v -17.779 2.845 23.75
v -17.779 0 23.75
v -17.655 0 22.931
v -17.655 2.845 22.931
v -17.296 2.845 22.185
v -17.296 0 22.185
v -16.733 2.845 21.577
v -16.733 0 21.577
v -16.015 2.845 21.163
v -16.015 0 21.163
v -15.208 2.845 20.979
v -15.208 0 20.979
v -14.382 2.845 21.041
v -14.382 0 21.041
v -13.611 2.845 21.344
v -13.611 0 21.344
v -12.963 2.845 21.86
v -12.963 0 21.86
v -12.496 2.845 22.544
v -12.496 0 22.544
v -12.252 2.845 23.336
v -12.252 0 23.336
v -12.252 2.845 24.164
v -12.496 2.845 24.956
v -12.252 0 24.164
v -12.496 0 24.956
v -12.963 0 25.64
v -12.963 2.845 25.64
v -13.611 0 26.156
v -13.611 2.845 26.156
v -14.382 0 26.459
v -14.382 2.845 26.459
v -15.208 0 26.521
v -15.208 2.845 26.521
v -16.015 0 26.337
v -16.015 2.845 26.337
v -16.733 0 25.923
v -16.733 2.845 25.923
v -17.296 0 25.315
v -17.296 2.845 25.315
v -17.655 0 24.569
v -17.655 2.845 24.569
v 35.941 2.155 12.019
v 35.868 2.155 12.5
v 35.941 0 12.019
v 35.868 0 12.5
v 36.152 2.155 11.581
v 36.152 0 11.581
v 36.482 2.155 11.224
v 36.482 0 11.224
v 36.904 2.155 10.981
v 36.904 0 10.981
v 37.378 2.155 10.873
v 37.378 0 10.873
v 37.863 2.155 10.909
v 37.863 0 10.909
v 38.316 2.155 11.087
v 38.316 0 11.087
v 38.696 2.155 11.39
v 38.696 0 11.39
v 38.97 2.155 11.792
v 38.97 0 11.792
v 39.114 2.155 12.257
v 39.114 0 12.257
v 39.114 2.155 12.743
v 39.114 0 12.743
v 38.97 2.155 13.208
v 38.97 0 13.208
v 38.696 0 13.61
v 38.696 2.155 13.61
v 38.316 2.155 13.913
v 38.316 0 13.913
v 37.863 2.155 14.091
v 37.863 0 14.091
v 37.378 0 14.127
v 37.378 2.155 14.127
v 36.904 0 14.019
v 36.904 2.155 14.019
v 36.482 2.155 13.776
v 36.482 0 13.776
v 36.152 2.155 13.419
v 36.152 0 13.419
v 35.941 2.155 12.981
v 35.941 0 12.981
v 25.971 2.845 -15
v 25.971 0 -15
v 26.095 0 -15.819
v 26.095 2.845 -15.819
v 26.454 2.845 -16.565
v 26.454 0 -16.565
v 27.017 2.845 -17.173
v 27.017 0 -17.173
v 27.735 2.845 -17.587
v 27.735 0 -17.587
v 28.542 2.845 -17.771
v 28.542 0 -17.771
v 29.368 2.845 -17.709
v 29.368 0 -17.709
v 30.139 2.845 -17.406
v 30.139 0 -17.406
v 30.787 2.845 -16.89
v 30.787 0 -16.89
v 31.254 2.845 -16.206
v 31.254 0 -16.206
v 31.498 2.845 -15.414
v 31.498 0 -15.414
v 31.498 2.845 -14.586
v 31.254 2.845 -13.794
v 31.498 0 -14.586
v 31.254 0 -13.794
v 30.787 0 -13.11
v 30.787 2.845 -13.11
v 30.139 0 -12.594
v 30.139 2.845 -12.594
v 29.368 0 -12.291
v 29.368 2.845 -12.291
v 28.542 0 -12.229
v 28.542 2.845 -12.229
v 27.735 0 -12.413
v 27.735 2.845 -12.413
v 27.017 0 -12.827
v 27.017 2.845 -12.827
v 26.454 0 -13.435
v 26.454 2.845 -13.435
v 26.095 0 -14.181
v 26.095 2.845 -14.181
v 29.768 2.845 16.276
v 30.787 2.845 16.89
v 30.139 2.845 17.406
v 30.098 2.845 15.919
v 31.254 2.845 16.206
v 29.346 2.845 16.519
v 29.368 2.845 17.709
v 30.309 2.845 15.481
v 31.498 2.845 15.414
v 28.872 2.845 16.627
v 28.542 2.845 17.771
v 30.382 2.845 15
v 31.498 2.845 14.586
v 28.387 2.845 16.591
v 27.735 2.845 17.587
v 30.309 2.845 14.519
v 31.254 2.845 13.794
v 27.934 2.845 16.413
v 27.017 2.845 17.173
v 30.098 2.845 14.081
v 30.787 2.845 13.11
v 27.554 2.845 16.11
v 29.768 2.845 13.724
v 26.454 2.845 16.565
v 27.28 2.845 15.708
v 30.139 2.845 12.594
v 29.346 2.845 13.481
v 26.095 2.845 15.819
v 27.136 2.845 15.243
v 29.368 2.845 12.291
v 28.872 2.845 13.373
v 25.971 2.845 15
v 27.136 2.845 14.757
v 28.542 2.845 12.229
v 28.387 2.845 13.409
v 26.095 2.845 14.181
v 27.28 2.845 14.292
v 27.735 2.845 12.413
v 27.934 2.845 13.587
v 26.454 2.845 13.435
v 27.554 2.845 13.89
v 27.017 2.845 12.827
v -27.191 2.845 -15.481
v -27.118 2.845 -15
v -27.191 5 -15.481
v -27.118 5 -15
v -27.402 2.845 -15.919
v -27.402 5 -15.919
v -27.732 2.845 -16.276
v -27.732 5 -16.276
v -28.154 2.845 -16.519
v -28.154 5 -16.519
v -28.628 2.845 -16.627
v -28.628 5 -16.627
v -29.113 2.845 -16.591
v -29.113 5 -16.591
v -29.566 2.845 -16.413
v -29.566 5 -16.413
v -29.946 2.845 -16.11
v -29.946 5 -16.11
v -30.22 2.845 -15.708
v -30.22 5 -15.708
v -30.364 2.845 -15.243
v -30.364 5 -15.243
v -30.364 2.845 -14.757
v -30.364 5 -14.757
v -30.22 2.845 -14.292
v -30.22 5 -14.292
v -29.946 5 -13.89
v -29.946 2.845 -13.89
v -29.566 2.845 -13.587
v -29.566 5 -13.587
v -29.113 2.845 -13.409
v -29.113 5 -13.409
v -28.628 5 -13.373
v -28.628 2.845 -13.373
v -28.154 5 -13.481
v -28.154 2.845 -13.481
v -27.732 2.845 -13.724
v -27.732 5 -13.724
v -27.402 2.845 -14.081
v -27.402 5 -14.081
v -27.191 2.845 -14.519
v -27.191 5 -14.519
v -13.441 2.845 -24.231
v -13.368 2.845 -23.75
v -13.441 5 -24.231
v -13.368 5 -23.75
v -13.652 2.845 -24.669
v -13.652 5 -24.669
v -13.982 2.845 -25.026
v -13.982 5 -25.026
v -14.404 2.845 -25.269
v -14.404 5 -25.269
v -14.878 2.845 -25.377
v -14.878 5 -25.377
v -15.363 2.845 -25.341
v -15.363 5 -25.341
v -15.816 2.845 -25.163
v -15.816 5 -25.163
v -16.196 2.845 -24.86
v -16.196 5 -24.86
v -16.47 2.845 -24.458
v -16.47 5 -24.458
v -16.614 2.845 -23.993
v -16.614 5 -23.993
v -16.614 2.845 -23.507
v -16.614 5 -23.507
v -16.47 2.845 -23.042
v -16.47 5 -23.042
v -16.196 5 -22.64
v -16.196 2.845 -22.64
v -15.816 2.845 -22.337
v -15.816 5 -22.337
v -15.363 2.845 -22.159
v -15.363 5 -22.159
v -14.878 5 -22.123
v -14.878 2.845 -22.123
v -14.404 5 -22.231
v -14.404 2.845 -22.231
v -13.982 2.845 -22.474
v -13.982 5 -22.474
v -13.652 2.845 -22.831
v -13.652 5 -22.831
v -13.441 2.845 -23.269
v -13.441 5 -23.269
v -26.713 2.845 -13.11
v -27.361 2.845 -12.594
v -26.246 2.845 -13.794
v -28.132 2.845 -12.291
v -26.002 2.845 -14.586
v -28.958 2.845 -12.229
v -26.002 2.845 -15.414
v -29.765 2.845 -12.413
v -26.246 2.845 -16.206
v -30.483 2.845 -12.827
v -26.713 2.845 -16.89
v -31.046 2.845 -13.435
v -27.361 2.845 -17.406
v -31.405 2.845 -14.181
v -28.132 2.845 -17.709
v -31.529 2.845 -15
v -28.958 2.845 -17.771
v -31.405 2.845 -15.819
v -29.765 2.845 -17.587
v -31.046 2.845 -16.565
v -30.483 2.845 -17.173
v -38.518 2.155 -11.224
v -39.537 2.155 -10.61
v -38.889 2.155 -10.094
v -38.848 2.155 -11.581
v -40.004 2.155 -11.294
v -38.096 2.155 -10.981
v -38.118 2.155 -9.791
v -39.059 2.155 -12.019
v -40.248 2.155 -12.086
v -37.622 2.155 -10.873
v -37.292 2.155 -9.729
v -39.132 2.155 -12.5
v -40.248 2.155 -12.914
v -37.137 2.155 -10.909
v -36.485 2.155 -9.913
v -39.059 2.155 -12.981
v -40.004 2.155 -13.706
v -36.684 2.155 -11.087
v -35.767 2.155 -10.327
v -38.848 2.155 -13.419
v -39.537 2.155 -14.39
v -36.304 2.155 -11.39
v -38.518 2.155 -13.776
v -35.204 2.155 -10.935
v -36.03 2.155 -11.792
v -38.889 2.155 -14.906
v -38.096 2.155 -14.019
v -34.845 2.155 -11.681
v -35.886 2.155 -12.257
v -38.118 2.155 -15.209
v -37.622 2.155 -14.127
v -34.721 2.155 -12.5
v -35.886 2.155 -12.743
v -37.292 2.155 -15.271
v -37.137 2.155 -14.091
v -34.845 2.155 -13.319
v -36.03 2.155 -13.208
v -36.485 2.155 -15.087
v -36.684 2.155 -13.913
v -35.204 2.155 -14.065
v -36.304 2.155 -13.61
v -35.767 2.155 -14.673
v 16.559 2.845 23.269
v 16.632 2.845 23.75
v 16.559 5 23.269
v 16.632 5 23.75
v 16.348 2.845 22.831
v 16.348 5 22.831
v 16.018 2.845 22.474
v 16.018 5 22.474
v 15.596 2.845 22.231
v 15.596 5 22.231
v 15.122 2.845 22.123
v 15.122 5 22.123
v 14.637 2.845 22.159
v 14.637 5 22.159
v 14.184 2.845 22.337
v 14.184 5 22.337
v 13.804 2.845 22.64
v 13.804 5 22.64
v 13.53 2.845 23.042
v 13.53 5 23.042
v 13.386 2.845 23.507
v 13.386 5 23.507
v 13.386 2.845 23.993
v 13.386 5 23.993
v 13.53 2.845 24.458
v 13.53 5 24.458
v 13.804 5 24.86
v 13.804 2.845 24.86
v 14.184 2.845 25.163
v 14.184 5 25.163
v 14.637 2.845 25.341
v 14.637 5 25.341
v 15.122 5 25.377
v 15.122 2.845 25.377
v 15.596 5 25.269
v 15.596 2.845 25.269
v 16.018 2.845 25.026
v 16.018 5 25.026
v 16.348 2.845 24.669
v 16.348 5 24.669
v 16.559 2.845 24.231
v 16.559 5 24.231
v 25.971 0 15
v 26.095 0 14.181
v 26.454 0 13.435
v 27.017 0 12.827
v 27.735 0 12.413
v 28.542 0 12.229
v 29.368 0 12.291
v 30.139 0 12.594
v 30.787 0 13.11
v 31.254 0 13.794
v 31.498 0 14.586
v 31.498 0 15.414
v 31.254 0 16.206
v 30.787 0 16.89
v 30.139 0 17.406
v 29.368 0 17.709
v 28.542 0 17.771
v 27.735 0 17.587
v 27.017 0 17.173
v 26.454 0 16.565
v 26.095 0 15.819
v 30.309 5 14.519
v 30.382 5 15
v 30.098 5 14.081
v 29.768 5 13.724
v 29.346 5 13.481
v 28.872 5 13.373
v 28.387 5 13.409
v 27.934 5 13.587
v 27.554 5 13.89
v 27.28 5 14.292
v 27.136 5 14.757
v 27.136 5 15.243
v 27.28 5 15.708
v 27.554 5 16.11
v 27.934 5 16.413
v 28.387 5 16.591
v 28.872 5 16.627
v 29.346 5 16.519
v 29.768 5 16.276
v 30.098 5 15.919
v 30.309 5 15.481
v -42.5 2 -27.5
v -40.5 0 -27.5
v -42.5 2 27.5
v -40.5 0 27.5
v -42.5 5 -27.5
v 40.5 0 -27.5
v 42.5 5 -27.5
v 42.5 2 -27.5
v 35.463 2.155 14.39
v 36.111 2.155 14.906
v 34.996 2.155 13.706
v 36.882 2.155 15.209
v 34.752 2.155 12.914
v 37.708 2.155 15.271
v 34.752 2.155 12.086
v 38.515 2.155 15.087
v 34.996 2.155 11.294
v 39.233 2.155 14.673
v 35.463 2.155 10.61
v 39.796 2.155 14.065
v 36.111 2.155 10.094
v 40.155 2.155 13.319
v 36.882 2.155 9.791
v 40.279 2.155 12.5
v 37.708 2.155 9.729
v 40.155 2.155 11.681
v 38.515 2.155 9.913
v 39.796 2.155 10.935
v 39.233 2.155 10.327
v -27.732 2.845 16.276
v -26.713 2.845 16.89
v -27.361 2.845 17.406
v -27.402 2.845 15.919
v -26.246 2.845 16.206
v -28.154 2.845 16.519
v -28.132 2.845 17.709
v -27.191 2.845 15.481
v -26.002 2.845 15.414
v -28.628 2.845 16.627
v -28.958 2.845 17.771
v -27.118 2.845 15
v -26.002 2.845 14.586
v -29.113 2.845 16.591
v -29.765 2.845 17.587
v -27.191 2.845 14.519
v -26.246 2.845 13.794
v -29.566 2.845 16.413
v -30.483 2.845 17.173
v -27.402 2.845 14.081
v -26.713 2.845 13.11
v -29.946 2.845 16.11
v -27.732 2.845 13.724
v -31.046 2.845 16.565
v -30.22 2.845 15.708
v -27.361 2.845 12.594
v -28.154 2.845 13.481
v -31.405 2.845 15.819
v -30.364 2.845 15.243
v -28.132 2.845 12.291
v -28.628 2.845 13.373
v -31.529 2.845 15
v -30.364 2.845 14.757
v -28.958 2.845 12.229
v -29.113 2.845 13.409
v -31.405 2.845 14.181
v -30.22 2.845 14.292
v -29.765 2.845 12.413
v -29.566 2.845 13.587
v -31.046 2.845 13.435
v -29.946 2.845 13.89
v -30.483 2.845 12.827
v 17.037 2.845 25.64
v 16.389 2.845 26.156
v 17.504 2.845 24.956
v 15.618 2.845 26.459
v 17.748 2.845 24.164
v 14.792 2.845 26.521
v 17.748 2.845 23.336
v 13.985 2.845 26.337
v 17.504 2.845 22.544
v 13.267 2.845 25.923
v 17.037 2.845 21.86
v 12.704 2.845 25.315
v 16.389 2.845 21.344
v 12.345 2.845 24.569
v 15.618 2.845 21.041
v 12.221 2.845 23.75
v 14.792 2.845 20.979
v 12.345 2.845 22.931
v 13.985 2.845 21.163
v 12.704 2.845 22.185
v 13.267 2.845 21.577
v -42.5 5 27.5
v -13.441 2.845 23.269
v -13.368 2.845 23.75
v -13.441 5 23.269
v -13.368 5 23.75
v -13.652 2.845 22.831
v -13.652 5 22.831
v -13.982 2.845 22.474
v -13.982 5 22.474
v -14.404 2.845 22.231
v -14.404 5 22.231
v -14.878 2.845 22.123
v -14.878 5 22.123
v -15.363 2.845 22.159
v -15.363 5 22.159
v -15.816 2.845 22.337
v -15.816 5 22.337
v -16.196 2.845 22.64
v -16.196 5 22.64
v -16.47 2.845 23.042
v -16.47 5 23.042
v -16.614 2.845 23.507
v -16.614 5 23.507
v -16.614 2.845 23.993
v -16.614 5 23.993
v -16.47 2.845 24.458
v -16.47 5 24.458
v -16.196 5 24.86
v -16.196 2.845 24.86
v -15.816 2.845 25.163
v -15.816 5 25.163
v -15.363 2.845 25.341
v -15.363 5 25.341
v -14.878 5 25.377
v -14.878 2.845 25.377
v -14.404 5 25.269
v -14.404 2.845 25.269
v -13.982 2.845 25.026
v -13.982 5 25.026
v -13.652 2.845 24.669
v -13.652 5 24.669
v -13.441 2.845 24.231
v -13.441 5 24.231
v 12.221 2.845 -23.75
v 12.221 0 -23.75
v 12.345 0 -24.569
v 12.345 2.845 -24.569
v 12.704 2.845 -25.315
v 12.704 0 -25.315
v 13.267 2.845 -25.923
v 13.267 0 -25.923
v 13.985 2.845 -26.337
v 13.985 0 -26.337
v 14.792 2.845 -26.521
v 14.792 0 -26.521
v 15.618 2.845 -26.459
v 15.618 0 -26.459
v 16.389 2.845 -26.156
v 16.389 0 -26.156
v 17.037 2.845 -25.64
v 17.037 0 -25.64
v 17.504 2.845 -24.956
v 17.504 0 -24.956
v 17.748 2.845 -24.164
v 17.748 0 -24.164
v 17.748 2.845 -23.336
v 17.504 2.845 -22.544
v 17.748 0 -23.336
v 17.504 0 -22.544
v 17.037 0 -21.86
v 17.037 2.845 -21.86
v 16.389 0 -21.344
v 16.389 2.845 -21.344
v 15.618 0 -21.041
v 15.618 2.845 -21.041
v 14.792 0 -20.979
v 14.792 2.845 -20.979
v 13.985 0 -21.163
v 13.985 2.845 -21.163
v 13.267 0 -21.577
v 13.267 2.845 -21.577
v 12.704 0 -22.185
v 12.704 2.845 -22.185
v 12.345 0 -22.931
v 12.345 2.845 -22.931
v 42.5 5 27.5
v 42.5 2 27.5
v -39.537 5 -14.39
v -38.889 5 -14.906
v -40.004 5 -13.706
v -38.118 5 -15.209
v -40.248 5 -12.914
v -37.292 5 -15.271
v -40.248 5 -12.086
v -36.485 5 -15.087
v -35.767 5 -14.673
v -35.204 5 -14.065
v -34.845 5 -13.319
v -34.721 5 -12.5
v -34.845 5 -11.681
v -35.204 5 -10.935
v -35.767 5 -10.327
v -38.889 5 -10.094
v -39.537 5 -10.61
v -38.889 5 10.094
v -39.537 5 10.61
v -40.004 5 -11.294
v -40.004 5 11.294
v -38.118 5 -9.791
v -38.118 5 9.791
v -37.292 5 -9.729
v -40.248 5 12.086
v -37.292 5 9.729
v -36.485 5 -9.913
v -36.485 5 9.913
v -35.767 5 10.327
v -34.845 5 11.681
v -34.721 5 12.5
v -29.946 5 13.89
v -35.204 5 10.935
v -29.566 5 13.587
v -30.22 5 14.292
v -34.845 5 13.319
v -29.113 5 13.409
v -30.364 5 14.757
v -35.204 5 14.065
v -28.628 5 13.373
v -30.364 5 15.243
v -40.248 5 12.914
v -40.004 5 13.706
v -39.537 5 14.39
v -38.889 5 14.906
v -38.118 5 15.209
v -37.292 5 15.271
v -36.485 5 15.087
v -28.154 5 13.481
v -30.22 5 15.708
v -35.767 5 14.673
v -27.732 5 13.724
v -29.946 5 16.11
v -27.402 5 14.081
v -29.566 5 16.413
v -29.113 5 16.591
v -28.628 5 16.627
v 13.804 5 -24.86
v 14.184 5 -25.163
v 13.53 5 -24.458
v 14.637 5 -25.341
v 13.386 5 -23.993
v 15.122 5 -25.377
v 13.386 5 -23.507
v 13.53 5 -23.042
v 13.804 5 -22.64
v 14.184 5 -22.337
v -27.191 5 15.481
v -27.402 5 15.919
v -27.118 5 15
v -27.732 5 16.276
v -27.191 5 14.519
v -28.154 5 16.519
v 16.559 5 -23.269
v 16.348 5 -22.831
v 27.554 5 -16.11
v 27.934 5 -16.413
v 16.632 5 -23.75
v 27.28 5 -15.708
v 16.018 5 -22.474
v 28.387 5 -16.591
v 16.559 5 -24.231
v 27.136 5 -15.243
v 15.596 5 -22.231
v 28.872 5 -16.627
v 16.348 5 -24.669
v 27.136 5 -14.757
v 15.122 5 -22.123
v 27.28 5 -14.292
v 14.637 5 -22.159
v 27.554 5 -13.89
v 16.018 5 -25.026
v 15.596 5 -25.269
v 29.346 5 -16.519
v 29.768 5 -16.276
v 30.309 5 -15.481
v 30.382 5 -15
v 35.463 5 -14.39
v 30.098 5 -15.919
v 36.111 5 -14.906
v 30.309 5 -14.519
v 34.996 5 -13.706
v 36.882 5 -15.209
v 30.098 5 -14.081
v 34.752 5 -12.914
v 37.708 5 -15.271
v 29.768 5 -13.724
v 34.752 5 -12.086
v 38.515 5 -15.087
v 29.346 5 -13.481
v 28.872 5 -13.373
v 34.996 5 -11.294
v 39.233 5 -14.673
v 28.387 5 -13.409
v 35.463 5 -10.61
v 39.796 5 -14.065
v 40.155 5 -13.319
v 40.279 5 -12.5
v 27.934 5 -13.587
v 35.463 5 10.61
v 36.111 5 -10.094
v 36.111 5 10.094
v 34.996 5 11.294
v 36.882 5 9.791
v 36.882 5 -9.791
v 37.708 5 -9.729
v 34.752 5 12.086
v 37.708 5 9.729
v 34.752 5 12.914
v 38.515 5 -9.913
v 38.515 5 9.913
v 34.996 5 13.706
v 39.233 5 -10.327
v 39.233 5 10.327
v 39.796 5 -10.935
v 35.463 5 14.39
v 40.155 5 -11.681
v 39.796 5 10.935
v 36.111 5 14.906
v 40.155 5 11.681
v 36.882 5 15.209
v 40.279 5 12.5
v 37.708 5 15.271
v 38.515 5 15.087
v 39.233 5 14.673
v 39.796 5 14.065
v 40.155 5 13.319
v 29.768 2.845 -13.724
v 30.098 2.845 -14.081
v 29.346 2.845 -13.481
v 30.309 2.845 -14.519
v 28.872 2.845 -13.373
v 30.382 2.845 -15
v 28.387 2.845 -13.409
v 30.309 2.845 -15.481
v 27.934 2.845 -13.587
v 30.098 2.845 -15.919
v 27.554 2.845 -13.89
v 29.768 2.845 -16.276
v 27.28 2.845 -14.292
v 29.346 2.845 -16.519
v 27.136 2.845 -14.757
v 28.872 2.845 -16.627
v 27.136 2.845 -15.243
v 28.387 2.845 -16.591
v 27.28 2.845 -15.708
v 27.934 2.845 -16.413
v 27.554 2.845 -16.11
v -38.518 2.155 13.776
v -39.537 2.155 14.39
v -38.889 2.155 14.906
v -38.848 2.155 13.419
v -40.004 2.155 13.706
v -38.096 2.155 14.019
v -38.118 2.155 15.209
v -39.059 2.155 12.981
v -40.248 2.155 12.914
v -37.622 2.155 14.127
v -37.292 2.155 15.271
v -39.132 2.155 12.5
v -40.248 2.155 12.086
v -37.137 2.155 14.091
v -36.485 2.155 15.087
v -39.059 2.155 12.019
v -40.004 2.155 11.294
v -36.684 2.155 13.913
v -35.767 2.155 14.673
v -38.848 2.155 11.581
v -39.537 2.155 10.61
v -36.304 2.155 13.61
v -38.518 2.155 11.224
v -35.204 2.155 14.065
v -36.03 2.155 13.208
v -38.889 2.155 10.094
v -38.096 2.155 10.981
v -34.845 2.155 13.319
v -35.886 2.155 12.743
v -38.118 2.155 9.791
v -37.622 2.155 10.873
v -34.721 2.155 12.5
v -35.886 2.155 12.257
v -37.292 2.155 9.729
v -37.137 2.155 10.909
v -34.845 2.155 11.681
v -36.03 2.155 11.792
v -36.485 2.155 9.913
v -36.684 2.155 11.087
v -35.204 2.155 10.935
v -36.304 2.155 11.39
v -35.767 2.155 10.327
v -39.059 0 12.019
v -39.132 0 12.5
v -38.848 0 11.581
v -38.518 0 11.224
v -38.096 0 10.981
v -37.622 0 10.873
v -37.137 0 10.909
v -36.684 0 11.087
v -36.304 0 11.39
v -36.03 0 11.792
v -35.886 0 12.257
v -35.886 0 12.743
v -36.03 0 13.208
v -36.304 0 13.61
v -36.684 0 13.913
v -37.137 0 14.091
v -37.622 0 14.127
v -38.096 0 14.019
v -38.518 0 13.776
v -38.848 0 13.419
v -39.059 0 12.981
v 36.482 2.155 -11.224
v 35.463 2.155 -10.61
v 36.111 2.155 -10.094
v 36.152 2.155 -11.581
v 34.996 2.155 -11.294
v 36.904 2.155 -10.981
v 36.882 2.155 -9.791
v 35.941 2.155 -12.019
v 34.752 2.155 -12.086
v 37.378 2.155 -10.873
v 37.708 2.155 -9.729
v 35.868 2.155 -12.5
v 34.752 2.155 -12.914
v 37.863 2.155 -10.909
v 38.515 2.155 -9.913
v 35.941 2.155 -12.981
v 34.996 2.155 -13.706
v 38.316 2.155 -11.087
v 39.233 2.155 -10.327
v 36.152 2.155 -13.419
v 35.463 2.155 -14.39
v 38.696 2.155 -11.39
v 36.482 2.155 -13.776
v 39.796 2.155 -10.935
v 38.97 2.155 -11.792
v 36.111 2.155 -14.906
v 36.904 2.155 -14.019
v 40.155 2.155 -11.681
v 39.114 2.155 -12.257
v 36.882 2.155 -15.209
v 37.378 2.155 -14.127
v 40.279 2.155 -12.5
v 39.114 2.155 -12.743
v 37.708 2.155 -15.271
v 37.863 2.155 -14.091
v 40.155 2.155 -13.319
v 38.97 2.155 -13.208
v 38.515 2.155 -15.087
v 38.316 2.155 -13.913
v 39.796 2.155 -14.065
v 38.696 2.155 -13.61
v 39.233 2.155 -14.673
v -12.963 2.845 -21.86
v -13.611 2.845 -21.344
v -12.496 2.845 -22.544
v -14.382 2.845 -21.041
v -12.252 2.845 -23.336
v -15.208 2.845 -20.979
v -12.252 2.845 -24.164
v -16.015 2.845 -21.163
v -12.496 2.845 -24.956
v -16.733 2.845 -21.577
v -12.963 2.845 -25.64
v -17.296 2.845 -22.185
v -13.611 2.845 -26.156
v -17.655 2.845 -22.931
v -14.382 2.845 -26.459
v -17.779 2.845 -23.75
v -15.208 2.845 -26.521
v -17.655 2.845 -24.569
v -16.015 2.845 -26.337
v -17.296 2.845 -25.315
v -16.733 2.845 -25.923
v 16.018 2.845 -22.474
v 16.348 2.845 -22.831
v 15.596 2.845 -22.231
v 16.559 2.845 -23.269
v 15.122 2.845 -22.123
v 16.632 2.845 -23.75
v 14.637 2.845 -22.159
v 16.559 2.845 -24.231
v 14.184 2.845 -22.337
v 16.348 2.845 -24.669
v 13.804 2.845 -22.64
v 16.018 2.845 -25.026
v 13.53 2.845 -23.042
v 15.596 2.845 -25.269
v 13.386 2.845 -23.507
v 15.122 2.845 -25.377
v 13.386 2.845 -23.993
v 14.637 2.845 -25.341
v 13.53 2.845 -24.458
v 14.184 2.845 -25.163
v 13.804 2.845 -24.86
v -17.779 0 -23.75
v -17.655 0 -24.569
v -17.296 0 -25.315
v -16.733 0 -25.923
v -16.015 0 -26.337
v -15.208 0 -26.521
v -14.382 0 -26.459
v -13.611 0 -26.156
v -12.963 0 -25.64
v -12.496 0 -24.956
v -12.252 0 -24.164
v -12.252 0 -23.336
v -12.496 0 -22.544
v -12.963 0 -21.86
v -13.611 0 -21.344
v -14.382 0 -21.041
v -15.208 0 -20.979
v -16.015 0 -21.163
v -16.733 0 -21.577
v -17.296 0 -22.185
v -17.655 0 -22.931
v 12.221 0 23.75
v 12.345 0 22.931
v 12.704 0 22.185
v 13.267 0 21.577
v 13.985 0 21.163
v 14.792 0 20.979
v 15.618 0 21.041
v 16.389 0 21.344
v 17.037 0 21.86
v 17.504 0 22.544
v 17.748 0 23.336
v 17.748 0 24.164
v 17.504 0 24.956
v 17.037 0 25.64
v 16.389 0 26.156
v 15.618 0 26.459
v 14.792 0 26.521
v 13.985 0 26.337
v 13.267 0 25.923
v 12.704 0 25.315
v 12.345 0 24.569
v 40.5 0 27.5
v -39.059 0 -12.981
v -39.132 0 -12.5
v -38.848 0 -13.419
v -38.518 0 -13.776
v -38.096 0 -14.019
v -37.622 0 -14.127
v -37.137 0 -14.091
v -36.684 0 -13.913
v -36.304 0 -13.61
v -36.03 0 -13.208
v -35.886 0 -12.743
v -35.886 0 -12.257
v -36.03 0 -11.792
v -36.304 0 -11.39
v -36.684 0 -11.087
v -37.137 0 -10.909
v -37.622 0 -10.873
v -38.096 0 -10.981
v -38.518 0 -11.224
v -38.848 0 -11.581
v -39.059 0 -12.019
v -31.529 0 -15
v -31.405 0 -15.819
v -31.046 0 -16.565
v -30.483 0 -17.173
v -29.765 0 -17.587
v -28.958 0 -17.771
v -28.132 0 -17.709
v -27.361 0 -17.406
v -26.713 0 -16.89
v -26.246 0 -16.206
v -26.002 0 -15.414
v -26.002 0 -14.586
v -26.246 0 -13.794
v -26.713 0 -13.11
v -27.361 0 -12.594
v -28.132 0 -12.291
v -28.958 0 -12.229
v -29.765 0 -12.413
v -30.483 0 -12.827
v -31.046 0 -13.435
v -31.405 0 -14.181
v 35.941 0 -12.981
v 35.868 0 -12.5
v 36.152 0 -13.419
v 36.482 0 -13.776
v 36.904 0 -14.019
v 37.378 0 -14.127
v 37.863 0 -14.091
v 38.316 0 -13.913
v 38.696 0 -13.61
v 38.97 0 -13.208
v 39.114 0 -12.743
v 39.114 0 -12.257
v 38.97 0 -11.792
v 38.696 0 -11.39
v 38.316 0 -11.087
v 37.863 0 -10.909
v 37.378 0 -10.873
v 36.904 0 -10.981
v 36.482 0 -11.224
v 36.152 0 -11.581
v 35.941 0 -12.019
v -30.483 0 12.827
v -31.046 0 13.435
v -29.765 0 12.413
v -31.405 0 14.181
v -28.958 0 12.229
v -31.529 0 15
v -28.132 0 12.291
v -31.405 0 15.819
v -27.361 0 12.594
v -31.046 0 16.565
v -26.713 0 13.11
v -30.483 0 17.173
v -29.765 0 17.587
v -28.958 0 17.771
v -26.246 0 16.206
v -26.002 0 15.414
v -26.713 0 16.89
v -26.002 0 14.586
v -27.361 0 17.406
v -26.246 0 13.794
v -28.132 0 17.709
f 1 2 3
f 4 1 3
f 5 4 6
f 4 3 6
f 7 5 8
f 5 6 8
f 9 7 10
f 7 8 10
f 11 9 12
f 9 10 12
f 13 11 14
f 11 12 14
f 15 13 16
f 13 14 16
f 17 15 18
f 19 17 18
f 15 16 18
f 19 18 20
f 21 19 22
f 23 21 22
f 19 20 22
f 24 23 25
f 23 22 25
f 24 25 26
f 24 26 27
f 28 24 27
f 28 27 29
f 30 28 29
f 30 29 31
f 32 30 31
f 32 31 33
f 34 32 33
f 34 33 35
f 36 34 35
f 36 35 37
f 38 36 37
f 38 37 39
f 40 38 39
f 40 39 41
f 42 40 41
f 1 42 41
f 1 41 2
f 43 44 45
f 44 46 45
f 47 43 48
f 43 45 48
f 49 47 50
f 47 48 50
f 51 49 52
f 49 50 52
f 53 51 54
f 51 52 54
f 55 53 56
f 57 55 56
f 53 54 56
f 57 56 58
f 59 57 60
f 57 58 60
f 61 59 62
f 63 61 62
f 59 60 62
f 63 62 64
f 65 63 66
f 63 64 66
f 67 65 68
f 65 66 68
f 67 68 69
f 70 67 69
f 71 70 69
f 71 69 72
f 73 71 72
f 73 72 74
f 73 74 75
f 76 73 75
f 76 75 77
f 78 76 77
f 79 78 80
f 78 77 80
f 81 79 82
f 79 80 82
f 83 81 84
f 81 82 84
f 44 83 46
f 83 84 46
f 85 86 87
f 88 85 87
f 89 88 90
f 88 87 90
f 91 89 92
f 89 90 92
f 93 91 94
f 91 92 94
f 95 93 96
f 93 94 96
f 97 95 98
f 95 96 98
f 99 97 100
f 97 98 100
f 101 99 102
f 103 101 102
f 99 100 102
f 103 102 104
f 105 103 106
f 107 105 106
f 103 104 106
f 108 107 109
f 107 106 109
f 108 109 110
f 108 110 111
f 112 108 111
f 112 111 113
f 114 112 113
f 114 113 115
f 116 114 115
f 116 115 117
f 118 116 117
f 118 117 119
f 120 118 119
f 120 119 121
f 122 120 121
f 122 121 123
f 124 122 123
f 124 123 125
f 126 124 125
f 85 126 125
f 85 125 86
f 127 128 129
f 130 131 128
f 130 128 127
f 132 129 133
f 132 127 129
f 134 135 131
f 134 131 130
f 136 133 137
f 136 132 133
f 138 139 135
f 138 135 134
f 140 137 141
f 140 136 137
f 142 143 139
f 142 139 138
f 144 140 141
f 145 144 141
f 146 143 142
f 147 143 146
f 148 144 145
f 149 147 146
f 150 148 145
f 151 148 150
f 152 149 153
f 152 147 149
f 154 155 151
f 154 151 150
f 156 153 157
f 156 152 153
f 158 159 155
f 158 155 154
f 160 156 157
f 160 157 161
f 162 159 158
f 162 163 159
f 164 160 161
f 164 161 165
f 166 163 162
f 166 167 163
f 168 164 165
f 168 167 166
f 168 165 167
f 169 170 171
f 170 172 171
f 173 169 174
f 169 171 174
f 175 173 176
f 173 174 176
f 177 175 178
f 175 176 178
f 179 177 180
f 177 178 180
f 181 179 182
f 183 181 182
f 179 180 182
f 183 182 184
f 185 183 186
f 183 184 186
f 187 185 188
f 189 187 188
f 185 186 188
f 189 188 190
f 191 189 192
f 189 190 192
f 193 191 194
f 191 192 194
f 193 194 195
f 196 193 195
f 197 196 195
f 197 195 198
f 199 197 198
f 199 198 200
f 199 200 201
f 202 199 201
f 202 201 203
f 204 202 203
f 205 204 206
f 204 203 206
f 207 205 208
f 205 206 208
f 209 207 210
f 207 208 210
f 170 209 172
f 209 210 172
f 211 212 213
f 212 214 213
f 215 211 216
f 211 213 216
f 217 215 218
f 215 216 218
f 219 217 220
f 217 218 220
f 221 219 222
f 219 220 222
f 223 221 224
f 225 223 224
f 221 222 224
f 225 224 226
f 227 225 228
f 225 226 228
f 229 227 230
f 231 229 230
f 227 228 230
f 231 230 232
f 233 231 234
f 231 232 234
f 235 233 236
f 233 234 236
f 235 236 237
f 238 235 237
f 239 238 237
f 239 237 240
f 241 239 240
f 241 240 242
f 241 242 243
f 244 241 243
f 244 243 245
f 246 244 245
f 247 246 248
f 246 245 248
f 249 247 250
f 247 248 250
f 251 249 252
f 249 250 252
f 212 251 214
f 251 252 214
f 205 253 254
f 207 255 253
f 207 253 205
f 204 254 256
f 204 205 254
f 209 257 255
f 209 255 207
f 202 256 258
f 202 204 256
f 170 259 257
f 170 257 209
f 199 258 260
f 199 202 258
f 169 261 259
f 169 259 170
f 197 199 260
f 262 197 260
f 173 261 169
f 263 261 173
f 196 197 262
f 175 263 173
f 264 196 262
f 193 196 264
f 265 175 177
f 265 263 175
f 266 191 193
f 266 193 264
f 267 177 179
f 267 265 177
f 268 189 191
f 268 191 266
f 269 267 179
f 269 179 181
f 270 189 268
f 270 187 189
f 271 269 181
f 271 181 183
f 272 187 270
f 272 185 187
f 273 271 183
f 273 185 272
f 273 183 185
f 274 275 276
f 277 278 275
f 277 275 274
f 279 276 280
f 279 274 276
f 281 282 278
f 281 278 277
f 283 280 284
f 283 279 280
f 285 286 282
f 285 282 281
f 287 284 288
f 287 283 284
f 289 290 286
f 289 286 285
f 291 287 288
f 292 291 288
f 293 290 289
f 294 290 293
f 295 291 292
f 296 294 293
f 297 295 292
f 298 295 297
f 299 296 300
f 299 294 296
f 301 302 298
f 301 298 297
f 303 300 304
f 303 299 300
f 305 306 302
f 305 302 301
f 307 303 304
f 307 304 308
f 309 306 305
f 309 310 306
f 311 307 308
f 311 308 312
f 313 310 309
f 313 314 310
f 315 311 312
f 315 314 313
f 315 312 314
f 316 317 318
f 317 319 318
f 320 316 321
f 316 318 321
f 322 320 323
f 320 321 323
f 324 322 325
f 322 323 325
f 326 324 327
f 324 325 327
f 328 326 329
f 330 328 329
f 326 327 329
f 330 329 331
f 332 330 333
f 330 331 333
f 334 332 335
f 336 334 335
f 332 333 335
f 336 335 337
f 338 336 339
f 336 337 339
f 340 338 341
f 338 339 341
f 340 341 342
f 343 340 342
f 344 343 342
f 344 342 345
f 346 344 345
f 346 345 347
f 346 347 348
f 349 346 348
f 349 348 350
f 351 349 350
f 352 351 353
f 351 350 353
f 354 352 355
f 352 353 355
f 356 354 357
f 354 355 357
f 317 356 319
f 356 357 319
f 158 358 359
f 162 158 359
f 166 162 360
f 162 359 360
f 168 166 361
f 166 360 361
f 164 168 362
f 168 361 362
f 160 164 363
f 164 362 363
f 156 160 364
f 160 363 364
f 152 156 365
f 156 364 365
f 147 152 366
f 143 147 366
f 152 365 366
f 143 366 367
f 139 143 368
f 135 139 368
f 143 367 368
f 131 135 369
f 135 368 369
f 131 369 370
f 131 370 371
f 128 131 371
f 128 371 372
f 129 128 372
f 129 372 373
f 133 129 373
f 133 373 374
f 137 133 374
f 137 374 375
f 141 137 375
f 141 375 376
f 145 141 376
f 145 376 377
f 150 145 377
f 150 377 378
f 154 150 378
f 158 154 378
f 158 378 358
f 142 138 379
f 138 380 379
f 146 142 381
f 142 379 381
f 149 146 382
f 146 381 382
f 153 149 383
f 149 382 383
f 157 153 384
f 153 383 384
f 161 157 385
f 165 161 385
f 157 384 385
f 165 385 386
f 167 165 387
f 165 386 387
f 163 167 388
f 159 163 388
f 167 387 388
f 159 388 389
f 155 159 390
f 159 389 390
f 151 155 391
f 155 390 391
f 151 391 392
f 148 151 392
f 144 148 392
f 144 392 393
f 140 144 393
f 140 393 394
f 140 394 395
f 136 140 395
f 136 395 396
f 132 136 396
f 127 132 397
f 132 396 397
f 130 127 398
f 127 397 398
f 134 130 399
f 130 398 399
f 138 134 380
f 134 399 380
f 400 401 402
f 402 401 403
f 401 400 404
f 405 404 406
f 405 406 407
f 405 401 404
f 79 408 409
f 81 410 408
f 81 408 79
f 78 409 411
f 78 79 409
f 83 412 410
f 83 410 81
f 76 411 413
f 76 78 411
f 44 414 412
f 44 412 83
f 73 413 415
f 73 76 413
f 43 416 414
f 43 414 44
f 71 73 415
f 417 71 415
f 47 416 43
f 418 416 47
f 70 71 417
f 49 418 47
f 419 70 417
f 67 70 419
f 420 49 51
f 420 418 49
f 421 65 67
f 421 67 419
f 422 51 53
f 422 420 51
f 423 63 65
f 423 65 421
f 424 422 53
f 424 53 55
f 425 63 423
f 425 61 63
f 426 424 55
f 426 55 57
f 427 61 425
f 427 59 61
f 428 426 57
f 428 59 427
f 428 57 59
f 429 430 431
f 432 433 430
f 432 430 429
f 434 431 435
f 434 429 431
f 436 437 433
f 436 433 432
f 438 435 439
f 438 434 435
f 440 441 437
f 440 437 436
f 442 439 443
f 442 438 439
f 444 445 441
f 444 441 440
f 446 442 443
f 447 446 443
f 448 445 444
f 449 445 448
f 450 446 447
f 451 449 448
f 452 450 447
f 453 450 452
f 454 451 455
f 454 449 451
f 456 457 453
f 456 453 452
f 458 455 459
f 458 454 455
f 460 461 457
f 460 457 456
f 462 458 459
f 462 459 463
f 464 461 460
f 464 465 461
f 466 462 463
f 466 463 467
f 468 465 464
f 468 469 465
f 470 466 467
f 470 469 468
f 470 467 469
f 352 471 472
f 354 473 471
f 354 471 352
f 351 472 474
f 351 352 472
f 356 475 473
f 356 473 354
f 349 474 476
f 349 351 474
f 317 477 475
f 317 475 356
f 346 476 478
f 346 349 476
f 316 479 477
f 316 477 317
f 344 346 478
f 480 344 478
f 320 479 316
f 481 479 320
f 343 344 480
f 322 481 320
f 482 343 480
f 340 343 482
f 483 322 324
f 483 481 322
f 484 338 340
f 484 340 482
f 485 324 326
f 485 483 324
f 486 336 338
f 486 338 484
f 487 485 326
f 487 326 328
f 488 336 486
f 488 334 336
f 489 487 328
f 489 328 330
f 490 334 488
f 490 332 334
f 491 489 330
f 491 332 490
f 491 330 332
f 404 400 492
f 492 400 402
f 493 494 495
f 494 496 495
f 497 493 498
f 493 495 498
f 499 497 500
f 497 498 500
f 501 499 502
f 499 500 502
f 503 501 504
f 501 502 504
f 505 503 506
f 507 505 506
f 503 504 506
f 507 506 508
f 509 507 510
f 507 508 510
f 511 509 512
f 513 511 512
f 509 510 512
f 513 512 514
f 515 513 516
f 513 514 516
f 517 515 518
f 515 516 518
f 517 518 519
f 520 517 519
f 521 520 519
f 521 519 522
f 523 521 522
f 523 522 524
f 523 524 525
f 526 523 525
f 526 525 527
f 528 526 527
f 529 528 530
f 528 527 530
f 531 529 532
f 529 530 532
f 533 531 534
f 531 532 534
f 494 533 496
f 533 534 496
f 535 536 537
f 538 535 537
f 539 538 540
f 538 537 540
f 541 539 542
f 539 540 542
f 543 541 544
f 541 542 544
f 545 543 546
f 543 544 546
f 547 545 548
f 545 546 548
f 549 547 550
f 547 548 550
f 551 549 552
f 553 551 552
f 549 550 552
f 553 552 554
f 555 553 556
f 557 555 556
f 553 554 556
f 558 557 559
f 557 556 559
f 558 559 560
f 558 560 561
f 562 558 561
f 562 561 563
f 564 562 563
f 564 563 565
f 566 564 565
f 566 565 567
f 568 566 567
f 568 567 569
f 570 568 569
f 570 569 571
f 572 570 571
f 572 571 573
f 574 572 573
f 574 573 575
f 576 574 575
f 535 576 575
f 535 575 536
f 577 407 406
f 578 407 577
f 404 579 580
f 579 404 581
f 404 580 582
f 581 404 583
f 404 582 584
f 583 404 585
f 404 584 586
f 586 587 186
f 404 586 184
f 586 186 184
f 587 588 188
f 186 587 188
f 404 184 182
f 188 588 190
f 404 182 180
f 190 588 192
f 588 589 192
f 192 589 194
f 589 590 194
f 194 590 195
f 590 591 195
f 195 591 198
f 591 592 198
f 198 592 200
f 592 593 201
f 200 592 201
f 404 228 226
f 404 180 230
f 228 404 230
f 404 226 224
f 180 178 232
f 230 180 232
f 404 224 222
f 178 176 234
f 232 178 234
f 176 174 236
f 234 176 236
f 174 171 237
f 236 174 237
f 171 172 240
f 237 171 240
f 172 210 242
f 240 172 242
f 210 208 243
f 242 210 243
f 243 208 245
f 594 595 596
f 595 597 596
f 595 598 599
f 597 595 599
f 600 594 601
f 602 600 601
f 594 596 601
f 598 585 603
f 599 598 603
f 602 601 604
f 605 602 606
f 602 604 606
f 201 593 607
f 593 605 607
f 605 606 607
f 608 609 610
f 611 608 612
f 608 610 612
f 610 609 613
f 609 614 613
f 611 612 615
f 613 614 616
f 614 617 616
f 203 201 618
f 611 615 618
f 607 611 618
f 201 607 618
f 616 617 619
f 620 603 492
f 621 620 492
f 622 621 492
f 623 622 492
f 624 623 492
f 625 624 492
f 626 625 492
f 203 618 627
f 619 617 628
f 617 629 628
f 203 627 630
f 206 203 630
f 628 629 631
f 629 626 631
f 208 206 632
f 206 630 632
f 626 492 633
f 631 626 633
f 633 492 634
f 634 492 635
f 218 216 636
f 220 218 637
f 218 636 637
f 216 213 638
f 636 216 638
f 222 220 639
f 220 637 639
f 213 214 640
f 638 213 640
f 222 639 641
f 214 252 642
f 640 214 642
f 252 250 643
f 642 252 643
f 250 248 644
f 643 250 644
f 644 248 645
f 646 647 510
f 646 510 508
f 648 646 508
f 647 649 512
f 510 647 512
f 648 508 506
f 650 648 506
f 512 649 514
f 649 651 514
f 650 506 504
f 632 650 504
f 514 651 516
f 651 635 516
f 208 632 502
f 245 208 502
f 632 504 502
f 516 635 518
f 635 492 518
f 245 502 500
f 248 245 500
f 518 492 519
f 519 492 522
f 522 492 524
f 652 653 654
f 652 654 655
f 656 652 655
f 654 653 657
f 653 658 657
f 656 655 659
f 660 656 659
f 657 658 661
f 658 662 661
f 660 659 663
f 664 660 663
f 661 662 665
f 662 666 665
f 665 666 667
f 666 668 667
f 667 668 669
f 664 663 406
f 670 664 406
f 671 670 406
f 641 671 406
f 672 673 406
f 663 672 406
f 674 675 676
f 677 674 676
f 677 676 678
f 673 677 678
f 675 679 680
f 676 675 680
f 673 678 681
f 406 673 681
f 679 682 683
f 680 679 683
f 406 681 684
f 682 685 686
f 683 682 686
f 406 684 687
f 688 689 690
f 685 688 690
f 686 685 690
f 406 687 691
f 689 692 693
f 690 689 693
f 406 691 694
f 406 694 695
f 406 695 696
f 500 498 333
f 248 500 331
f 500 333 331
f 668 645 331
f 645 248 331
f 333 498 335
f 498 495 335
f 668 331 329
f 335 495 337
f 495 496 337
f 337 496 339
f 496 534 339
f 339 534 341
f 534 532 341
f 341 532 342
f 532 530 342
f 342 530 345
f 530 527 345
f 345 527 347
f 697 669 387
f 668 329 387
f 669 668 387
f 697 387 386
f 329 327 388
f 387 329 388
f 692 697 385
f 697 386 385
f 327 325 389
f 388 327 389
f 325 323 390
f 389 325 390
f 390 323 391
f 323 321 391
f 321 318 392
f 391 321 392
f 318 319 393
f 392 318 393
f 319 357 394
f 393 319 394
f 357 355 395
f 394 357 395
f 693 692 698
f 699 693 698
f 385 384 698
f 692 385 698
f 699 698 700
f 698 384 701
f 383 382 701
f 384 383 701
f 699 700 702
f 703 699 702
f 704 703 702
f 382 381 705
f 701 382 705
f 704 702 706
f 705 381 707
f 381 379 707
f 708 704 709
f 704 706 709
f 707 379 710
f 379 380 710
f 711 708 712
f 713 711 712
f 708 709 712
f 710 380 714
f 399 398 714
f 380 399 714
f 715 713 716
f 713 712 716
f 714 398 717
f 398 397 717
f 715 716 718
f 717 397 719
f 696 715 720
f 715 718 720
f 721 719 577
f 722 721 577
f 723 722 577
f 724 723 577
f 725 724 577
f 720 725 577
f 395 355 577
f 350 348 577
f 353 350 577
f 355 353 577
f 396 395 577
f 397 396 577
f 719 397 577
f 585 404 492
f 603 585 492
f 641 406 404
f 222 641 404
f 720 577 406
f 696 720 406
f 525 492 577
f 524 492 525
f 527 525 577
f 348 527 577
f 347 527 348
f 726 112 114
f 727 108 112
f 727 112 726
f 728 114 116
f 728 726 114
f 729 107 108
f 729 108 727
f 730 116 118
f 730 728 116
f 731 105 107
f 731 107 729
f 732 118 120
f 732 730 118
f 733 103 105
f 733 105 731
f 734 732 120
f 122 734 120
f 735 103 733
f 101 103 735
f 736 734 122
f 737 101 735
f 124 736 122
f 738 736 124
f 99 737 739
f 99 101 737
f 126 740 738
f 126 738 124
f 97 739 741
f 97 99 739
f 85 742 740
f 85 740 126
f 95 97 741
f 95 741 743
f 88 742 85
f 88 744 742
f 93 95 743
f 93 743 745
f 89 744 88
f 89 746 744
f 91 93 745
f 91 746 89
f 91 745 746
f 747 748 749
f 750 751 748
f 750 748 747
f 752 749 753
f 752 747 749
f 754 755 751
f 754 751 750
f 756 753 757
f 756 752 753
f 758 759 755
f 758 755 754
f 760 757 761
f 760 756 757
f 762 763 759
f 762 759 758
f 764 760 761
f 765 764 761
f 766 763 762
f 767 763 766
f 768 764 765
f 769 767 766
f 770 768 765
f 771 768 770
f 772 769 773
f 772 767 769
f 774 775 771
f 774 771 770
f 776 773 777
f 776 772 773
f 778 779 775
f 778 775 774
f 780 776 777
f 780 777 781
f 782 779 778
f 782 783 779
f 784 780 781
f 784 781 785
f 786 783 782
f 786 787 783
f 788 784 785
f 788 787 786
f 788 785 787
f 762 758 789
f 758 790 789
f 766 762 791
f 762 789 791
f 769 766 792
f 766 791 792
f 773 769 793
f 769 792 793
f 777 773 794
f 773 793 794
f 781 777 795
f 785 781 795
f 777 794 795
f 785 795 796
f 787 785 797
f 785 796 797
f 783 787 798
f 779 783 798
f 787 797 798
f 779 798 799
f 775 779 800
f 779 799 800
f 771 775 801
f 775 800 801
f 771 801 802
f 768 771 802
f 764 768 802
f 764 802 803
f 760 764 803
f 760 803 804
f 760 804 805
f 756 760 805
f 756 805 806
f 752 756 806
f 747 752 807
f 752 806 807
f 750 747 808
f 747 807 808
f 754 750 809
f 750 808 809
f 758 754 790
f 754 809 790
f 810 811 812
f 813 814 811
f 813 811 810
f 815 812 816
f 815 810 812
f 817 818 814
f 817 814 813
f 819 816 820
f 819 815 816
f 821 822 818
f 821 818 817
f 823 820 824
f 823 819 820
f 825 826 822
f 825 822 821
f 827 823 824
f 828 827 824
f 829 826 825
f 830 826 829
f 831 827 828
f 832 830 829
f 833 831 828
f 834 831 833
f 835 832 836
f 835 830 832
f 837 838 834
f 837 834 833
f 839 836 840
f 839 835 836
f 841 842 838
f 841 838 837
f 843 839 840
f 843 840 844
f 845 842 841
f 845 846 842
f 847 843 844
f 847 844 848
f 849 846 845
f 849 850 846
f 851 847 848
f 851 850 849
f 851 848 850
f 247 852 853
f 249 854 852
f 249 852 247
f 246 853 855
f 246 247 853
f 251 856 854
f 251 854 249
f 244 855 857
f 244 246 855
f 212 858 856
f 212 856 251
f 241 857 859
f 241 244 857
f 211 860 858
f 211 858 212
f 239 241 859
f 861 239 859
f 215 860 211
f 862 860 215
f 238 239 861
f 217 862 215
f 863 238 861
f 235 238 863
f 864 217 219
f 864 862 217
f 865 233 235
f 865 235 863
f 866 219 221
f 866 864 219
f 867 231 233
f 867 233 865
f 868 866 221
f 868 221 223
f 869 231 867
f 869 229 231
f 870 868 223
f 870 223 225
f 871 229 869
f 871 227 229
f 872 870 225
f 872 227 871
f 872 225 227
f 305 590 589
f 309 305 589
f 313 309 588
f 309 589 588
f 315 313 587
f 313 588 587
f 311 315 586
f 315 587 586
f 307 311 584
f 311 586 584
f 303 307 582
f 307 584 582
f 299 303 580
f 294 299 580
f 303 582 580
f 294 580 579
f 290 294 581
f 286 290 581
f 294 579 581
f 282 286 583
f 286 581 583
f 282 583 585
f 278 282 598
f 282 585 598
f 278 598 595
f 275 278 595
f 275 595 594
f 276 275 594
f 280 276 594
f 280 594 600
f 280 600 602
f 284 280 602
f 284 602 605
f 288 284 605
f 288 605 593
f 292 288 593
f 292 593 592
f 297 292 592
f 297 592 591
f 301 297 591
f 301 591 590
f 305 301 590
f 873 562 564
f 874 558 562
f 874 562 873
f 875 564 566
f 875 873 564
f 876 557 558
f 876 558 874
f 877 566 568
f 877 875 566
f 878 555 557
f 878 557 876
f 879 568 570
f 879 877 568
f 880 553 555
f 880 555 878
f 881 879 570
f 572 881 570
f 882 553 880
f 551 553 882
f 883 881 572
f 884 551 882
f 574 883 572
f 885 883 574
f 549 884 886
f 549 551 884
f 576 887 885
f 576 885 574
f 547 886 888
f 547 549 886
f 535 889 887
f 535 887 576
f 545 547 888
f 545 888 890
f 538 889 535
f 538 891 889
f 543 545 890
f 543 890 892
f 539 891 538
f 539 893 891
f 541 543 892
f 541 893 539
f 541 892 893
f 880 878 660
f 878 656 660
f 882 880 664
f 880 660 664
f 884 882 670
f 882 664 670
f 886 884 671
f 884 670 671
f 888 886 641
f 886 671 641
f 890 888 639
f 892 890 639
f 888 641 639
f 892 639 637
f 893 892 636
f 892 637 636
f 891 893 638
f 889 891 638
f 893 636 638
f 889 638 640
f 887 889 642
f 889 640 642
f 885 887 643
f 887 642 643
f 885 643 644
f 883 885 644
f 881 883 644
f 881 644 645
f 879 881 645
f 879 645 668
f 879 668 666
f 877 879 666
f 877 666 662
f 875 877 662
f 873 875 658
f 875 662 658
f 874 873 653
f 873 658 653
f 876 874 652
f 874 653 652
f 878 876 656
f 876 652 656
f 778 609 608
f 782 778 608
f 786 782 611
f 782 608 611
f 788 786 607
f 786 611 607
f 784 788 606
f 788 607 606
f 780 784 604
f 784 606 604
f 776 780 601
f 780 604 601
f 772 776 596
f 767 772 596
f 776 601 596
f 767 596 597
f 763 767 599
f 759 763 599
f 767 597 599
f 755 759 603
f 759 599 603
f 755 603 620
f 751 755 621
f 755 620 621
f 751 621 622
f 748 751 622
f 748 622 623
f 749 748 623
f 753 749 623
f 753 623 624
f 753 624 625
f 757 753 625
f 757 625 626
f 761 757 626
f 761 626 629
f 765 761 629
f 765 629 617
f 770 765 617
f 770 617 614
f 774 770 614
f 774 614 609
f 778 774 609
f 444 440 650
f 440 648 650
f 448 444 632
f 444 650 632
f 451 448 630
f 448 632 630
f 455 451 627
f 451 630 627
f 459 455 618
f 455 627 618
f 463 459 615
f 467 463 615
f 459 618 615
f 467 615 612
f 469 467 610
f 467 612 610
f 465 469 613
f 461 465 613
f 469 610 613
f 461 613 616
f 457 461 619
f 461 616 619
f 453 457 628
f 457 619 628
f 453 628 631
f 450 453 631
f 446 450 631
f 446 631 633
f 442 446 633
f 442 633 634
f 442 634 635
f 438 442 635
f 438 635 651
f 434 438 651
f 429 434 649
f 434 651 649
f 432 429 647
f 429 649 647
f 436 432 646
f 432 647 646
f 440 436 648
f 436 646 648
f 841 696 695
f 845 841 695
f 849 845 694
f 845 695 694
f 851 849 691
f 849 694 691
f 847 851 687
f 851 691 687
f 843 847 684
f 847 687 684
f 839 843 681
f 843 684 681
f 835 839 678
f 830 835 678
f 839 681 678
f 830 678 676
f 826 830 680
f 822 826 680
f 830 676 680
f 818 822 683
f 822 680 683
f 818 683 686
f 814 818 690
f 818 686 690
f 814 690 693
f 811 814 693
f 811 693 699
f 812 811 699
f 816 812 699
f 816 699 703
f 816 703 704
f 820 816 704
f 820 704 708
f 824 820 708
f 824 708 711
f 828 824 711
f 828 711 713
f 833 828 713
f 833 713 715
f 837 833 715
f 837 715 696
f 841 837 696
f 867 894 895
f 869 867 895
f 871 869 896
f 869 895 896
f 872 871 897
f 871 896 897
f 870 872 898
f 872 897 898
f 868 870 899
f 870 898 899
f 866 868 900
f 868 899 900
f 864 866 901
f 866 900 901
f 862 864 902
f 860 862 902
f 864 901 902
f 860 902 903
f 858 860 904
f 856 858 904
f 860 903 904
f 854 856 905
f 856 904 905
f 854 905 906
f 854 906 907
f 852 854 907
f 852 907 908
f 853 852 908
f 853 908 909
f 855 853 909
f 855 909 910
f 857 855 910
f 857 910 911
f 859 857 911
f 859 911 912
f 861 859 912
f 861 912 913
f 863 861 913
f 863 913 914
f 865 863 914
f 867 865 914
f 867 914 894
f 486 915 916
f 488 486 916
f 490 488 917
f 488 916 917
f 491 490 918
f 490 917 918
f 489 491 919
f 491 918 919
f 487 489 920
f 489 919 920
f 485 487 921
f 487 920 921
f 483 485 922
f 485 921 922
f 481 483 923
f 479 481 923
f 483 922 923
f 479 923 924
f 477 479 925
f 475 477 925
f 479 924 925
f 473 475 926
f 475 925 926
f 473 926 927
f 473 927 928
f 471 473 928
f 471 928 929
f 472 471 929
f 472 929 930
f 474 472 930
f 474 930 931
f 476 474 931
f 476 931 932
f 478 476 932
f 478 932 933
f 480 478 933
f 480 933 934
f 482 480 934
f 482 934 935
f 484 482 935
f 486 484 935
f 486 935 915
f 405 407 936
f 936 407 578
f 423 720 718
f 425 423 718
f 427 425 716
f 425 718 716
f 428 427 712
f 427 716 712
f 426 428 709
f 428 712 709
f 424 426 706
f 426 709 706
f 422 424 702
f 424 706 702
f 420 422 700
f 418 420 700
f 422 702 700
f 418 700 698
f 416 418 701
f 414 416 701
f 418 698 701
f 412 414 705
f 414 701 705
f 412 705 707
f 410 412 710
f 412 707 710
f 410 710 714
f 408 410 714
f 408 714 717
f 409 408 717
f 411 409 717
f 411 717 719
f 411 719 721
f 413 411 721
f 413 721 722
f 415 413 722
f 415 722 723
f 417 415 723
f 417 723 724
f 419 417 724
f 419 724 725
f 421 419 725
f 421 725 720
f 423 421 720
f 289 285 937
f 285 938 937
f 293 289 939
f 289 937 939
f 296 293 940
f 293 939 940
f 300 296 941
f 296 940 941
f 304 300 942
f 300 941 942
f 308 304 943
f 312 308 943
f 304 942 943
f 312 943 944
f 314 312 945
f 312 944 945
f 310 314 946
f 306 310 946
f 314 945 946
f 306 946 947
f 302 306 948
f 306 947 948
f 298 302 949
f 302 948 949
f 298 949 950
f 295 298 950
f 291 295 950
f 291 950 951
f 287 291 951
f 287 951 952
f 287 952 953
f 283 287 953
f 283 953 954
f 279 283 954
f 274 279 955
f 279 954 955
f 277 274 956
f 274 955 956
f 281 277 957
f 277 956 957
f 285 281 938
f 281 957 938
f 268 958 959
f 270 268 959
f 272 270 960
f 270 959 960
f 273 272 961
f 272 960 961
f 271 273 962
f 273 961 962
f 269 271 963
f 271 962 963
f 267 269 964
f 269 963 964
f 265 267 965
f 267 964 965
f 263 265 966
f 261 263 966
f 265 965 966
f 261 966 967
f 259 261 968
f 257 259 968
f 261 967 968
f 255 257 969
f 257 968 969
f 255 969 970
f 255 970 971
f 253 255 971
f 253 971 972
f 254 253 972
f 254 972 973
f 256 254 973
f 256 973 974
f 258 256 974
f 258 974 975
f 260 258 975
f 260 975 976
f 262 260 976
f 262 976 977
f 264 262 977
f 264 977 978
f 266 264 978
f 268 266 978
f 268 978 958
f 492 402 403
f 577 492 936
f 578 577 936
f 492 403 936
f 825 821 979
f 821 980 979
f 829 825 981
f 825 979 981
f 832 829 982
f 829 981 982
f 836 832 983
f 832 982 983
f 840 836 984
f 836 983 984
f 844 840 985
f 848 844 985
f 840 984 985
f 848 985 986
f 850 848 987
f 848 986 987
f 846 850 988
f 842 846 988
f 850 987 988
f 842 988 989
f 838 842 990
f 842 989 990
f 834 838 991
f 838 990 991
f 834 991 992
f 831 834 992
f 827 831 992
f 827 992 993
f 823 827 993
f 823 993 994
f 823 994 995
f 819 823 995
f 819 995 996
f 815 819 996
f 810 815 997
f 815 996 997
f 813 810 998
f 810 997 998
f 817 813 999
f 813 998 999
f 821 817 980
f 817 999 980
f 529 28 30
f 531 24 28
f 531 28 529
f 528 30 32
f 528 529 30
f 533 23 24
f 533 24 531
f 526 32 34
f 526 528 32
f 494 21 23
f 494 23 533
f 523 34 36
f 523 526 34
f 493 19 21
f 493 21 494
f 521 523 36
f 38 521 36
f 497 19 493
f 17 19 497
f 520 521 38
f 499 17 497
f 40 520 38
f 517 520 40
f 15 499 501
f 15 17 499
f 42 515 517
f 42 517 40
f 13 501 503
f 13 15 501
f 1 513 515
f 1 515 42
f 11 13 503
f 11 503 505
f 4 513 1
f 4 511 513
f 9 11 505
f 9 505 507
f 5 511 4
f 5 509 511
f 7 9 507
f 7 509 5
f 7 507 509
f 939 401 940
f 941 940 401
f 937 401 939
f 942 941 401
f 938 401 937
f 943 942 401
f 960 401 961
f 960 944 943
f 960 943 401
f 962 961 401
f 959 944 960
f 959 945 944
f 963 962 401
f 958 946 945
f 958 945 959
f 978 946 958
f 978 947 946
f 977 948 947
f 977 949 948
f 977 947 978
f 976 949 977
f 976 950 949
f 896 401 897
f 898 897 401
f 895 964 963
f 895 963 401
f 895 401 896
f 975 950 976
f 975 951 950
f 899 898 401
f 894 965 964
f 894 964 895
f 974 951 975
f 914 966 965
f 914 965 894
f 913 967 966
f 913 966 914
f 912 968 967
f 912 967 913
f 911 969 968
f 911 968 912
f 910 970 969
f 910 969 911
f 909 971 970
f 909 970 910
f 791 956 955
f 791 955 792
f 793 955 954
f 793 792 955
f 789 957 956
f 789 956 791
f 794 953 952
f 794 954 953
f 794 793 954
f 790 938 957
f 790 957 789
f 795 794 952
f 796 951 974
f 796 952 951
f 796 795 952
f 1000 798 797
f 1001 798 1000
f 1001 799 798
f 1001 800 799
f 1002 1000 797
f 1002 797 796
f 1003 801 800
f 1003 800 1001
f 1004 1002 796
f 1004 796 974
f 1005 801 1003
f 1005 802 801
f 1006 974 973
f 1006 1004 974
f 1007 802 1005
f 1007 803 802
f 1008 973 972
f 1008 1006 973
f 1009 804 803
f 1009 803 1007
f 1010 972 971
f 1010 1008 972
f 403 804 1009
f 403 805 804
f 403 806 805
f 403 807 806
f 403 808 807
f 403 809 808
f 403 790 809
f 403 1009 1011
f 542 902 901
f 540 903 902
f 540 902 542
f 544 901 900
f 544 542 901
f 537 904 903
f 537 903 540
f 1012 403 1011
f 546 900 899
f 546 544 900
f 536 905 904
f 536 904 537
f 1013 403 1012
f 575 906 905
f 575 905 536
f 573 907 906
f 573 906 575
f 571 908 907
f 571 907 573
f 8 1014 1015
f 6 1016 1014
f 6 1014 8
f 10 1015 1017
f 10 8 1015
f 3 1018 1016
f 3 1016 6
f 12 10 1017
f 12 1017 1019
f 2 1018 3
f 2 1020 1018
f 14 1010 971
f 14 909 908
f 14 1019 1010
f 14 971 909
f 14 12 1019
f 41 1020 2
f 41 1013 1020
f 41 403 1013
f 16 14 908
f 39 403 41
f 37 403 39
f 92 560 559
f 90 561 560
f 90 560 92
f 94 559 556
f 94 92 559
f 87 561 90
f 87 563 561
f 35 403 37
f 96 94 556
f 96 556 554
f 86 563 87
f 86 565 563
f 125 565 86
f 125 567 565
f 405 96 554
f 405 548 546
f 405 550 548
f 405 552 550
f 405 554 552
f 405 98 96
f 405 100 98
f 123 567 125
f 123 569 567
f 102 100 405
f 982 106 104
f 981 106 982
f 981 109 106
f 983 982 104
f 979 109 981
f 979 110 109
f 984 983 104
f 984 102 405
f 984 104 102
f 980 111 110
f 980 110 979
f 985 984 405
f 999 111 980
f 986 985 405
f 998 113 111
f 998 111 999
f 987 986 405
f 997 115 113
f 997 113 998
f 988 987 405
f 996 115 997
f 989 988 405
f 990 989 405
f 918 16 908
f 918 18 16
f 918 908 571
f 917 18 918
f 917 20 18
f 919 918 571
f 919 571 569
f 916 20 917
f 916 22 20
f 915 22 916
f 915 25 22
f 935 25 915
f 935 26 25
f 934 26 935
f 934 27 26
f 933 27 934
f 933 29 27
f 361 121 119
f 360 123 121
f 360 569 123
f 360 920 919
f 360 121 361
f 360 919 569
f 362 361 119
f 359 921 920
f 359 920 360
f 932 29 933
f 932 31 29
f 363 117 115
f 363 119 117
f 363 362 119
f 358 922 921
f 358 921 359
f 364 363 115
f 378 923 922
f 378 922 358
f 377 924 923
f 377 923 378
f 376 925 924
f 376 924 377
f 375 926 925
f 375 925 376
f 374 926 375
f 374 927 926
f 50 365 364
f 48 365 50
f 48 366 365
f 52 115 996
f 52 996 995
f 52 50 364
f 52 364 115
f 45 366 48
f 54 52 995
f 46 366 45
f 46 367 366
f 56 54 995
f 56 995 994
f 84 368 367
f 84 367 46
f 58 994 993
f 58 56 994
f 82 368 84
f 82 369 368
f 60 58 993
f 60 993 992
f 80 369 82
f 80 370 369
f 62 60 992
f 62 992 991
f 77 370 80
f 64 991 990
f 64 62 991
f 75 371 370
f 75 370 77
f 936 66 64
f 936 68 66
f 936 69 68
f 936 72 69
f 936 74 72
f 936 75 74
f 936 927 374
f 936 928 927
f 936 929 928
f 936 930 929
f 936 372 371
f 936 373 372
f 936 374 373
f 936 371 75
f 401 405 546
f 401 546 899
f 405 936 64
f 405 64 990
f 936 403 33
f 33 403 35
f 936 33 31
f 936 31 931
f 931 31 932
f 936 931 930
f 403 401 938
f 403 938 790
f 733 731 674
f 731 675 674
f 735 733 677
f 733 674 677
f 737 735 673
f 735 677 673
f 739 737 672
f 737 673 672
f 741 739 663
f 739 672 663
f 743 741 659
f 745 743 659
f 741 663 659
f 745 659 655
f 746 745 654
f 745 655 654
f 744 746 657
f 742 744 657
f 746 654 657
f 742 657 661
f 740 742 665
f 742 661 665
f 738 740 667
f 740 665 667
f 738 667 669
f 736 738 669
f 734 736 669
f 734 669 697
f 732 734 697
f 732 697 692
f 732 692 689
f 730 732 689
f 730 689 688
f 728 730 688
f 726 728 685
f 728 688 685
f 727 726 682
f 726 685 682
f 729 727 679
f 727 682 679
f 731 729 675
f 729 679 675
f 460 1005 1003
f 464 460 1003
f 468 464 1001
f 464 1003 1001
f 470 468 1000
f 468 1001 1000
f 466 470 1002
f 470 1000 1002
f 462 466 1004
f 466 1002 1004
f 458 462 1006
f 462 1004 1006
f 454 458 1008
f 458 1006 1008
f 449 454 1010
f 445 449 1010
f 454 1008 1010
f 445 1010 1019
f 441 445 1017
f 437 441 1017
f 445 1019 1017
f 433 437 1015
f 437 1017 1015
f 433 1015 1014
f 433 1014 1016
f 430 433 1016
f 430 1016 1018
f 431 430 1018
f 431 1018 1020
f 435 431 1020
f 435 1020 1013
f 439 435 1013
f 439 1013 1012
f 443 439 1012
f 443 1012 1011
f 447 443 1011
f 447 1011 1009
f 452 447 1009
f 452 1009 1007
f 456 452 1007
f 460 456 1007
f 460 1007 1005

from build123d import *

# Parameters (mm, degrees)
SKETCH2_W                                      = 55
SKETCH2_H                                      = 55
BOSS_EXTRUDE1_DEPTH                            = 5
SKETCH6_W                                      = 15
SKETCH6_H                                      = 55
BOSS_EXTRUDE2_DEPTH                            = 5
CBORE_FOR_4_SOCKET_HEAD_CAP_SCREW2_D           = 3.2639
CBORE_FOR_4_SOCKET_HEAD_CAP_SCREW2_CBORE_D     = 5.55752
CBORE_FOR_4_SOCKET_HEAD_CAP_SCREW2_CBORE_DEPTH = 2.8448
CBORE_FOR_4_SOCKET_HEAD_CAP_SCREW3_D           = 3.2639
CBORE_FOR_4_SOCKET_HEAD_CAP_SCREW3_CBORE_D     = 5.55752
CBORE_FOR_4_SOCKET_HEAD_CAP_SCREW3_CBORE_DEPTH = 2.8448
CHAMFER1_SIZE                                  = 2


with BuildPart() as part:
    # Sketch2 → Boss-Extrude1 (new body)
    with BuildSketch(Plane(origin=(0, 0, 0), x_dir=(1, 0, 0), z_dir=(0, 1, 0))):
        Rectangle(SKETCH2_W, SKETCH2_H)
    extrude(amount=BOSS_EXTRUDE1_DEPTH)

    # Sketch6 → Boss-Extrude2 (add)
    with BuildSketch(Plane.XZ):
        with Locations((-35, 0)):
            Rectangle(SKETCH6_W, SKETCH6_H)
        with Locations((35, 0)):
            Rectangle(SKETCH6_W, SKETCH6_H)
    extrude(amount=-BOSS_EXTRUDE2_DEPTH)

    # CBORE for #4 Socket Head Cap Screw2 (through all)
    with Locations(Plane(origin=(0, 5, 0), x_dir=(1, 0, 0), z_dir=(0, 1, 0))):
        with Locations((-37.5, 12.5), (-37.5, -12.5), (37.5, -12.5), (37.5, 12.5)):
            CounterBoreHole(CBORE_FOR_4_SOCKET_HEAD_CAP_SCREW2_D / 2, CBORE_FOR_4_SOCKET_HEAD_CAP_SCREW2_CBORE_D / 2, CBORE_FOR_4_SOCKET_HEAD_CAP_SCREW2_CBORE_DEPTH)

    # CBORE for #4 Socket Head Cap Screw3 (through all)
    with Locations(Plane(origin=(0, 0, 0), x_dir=(-1, 0, 0), z_dir=(0, -1, 0))):
        with Locations((-28.75, 15), (-15, 23.75), (-28.75, -15), (-15, -23.75), (15, -23.75), (28.75, -15), (28.75, 15), (15, 23.75)):
            CounterBoreHole(CBORE_FOR_4_SOCKET_HEAD_CAP_SCREW3_D / 2, CBORE_FOR_4_SOCKET_HEAD_CAP_SCREW3_CBORE_D / 2, CBORE_FOR_4_SOCKET_HEAD_CAP_SCREW3_CBORE_DEPTH)

    # Chamfer1
    chamfer1_edges = [part.edges().sort_by_distance(p)[0] for p in [
        (-42.5, 0, 0),
        (42.5, 0, 0),
    ]]
    chamfer(chamfer1_edges, length=CHAMFER1_SIZE)


solid = part.part
